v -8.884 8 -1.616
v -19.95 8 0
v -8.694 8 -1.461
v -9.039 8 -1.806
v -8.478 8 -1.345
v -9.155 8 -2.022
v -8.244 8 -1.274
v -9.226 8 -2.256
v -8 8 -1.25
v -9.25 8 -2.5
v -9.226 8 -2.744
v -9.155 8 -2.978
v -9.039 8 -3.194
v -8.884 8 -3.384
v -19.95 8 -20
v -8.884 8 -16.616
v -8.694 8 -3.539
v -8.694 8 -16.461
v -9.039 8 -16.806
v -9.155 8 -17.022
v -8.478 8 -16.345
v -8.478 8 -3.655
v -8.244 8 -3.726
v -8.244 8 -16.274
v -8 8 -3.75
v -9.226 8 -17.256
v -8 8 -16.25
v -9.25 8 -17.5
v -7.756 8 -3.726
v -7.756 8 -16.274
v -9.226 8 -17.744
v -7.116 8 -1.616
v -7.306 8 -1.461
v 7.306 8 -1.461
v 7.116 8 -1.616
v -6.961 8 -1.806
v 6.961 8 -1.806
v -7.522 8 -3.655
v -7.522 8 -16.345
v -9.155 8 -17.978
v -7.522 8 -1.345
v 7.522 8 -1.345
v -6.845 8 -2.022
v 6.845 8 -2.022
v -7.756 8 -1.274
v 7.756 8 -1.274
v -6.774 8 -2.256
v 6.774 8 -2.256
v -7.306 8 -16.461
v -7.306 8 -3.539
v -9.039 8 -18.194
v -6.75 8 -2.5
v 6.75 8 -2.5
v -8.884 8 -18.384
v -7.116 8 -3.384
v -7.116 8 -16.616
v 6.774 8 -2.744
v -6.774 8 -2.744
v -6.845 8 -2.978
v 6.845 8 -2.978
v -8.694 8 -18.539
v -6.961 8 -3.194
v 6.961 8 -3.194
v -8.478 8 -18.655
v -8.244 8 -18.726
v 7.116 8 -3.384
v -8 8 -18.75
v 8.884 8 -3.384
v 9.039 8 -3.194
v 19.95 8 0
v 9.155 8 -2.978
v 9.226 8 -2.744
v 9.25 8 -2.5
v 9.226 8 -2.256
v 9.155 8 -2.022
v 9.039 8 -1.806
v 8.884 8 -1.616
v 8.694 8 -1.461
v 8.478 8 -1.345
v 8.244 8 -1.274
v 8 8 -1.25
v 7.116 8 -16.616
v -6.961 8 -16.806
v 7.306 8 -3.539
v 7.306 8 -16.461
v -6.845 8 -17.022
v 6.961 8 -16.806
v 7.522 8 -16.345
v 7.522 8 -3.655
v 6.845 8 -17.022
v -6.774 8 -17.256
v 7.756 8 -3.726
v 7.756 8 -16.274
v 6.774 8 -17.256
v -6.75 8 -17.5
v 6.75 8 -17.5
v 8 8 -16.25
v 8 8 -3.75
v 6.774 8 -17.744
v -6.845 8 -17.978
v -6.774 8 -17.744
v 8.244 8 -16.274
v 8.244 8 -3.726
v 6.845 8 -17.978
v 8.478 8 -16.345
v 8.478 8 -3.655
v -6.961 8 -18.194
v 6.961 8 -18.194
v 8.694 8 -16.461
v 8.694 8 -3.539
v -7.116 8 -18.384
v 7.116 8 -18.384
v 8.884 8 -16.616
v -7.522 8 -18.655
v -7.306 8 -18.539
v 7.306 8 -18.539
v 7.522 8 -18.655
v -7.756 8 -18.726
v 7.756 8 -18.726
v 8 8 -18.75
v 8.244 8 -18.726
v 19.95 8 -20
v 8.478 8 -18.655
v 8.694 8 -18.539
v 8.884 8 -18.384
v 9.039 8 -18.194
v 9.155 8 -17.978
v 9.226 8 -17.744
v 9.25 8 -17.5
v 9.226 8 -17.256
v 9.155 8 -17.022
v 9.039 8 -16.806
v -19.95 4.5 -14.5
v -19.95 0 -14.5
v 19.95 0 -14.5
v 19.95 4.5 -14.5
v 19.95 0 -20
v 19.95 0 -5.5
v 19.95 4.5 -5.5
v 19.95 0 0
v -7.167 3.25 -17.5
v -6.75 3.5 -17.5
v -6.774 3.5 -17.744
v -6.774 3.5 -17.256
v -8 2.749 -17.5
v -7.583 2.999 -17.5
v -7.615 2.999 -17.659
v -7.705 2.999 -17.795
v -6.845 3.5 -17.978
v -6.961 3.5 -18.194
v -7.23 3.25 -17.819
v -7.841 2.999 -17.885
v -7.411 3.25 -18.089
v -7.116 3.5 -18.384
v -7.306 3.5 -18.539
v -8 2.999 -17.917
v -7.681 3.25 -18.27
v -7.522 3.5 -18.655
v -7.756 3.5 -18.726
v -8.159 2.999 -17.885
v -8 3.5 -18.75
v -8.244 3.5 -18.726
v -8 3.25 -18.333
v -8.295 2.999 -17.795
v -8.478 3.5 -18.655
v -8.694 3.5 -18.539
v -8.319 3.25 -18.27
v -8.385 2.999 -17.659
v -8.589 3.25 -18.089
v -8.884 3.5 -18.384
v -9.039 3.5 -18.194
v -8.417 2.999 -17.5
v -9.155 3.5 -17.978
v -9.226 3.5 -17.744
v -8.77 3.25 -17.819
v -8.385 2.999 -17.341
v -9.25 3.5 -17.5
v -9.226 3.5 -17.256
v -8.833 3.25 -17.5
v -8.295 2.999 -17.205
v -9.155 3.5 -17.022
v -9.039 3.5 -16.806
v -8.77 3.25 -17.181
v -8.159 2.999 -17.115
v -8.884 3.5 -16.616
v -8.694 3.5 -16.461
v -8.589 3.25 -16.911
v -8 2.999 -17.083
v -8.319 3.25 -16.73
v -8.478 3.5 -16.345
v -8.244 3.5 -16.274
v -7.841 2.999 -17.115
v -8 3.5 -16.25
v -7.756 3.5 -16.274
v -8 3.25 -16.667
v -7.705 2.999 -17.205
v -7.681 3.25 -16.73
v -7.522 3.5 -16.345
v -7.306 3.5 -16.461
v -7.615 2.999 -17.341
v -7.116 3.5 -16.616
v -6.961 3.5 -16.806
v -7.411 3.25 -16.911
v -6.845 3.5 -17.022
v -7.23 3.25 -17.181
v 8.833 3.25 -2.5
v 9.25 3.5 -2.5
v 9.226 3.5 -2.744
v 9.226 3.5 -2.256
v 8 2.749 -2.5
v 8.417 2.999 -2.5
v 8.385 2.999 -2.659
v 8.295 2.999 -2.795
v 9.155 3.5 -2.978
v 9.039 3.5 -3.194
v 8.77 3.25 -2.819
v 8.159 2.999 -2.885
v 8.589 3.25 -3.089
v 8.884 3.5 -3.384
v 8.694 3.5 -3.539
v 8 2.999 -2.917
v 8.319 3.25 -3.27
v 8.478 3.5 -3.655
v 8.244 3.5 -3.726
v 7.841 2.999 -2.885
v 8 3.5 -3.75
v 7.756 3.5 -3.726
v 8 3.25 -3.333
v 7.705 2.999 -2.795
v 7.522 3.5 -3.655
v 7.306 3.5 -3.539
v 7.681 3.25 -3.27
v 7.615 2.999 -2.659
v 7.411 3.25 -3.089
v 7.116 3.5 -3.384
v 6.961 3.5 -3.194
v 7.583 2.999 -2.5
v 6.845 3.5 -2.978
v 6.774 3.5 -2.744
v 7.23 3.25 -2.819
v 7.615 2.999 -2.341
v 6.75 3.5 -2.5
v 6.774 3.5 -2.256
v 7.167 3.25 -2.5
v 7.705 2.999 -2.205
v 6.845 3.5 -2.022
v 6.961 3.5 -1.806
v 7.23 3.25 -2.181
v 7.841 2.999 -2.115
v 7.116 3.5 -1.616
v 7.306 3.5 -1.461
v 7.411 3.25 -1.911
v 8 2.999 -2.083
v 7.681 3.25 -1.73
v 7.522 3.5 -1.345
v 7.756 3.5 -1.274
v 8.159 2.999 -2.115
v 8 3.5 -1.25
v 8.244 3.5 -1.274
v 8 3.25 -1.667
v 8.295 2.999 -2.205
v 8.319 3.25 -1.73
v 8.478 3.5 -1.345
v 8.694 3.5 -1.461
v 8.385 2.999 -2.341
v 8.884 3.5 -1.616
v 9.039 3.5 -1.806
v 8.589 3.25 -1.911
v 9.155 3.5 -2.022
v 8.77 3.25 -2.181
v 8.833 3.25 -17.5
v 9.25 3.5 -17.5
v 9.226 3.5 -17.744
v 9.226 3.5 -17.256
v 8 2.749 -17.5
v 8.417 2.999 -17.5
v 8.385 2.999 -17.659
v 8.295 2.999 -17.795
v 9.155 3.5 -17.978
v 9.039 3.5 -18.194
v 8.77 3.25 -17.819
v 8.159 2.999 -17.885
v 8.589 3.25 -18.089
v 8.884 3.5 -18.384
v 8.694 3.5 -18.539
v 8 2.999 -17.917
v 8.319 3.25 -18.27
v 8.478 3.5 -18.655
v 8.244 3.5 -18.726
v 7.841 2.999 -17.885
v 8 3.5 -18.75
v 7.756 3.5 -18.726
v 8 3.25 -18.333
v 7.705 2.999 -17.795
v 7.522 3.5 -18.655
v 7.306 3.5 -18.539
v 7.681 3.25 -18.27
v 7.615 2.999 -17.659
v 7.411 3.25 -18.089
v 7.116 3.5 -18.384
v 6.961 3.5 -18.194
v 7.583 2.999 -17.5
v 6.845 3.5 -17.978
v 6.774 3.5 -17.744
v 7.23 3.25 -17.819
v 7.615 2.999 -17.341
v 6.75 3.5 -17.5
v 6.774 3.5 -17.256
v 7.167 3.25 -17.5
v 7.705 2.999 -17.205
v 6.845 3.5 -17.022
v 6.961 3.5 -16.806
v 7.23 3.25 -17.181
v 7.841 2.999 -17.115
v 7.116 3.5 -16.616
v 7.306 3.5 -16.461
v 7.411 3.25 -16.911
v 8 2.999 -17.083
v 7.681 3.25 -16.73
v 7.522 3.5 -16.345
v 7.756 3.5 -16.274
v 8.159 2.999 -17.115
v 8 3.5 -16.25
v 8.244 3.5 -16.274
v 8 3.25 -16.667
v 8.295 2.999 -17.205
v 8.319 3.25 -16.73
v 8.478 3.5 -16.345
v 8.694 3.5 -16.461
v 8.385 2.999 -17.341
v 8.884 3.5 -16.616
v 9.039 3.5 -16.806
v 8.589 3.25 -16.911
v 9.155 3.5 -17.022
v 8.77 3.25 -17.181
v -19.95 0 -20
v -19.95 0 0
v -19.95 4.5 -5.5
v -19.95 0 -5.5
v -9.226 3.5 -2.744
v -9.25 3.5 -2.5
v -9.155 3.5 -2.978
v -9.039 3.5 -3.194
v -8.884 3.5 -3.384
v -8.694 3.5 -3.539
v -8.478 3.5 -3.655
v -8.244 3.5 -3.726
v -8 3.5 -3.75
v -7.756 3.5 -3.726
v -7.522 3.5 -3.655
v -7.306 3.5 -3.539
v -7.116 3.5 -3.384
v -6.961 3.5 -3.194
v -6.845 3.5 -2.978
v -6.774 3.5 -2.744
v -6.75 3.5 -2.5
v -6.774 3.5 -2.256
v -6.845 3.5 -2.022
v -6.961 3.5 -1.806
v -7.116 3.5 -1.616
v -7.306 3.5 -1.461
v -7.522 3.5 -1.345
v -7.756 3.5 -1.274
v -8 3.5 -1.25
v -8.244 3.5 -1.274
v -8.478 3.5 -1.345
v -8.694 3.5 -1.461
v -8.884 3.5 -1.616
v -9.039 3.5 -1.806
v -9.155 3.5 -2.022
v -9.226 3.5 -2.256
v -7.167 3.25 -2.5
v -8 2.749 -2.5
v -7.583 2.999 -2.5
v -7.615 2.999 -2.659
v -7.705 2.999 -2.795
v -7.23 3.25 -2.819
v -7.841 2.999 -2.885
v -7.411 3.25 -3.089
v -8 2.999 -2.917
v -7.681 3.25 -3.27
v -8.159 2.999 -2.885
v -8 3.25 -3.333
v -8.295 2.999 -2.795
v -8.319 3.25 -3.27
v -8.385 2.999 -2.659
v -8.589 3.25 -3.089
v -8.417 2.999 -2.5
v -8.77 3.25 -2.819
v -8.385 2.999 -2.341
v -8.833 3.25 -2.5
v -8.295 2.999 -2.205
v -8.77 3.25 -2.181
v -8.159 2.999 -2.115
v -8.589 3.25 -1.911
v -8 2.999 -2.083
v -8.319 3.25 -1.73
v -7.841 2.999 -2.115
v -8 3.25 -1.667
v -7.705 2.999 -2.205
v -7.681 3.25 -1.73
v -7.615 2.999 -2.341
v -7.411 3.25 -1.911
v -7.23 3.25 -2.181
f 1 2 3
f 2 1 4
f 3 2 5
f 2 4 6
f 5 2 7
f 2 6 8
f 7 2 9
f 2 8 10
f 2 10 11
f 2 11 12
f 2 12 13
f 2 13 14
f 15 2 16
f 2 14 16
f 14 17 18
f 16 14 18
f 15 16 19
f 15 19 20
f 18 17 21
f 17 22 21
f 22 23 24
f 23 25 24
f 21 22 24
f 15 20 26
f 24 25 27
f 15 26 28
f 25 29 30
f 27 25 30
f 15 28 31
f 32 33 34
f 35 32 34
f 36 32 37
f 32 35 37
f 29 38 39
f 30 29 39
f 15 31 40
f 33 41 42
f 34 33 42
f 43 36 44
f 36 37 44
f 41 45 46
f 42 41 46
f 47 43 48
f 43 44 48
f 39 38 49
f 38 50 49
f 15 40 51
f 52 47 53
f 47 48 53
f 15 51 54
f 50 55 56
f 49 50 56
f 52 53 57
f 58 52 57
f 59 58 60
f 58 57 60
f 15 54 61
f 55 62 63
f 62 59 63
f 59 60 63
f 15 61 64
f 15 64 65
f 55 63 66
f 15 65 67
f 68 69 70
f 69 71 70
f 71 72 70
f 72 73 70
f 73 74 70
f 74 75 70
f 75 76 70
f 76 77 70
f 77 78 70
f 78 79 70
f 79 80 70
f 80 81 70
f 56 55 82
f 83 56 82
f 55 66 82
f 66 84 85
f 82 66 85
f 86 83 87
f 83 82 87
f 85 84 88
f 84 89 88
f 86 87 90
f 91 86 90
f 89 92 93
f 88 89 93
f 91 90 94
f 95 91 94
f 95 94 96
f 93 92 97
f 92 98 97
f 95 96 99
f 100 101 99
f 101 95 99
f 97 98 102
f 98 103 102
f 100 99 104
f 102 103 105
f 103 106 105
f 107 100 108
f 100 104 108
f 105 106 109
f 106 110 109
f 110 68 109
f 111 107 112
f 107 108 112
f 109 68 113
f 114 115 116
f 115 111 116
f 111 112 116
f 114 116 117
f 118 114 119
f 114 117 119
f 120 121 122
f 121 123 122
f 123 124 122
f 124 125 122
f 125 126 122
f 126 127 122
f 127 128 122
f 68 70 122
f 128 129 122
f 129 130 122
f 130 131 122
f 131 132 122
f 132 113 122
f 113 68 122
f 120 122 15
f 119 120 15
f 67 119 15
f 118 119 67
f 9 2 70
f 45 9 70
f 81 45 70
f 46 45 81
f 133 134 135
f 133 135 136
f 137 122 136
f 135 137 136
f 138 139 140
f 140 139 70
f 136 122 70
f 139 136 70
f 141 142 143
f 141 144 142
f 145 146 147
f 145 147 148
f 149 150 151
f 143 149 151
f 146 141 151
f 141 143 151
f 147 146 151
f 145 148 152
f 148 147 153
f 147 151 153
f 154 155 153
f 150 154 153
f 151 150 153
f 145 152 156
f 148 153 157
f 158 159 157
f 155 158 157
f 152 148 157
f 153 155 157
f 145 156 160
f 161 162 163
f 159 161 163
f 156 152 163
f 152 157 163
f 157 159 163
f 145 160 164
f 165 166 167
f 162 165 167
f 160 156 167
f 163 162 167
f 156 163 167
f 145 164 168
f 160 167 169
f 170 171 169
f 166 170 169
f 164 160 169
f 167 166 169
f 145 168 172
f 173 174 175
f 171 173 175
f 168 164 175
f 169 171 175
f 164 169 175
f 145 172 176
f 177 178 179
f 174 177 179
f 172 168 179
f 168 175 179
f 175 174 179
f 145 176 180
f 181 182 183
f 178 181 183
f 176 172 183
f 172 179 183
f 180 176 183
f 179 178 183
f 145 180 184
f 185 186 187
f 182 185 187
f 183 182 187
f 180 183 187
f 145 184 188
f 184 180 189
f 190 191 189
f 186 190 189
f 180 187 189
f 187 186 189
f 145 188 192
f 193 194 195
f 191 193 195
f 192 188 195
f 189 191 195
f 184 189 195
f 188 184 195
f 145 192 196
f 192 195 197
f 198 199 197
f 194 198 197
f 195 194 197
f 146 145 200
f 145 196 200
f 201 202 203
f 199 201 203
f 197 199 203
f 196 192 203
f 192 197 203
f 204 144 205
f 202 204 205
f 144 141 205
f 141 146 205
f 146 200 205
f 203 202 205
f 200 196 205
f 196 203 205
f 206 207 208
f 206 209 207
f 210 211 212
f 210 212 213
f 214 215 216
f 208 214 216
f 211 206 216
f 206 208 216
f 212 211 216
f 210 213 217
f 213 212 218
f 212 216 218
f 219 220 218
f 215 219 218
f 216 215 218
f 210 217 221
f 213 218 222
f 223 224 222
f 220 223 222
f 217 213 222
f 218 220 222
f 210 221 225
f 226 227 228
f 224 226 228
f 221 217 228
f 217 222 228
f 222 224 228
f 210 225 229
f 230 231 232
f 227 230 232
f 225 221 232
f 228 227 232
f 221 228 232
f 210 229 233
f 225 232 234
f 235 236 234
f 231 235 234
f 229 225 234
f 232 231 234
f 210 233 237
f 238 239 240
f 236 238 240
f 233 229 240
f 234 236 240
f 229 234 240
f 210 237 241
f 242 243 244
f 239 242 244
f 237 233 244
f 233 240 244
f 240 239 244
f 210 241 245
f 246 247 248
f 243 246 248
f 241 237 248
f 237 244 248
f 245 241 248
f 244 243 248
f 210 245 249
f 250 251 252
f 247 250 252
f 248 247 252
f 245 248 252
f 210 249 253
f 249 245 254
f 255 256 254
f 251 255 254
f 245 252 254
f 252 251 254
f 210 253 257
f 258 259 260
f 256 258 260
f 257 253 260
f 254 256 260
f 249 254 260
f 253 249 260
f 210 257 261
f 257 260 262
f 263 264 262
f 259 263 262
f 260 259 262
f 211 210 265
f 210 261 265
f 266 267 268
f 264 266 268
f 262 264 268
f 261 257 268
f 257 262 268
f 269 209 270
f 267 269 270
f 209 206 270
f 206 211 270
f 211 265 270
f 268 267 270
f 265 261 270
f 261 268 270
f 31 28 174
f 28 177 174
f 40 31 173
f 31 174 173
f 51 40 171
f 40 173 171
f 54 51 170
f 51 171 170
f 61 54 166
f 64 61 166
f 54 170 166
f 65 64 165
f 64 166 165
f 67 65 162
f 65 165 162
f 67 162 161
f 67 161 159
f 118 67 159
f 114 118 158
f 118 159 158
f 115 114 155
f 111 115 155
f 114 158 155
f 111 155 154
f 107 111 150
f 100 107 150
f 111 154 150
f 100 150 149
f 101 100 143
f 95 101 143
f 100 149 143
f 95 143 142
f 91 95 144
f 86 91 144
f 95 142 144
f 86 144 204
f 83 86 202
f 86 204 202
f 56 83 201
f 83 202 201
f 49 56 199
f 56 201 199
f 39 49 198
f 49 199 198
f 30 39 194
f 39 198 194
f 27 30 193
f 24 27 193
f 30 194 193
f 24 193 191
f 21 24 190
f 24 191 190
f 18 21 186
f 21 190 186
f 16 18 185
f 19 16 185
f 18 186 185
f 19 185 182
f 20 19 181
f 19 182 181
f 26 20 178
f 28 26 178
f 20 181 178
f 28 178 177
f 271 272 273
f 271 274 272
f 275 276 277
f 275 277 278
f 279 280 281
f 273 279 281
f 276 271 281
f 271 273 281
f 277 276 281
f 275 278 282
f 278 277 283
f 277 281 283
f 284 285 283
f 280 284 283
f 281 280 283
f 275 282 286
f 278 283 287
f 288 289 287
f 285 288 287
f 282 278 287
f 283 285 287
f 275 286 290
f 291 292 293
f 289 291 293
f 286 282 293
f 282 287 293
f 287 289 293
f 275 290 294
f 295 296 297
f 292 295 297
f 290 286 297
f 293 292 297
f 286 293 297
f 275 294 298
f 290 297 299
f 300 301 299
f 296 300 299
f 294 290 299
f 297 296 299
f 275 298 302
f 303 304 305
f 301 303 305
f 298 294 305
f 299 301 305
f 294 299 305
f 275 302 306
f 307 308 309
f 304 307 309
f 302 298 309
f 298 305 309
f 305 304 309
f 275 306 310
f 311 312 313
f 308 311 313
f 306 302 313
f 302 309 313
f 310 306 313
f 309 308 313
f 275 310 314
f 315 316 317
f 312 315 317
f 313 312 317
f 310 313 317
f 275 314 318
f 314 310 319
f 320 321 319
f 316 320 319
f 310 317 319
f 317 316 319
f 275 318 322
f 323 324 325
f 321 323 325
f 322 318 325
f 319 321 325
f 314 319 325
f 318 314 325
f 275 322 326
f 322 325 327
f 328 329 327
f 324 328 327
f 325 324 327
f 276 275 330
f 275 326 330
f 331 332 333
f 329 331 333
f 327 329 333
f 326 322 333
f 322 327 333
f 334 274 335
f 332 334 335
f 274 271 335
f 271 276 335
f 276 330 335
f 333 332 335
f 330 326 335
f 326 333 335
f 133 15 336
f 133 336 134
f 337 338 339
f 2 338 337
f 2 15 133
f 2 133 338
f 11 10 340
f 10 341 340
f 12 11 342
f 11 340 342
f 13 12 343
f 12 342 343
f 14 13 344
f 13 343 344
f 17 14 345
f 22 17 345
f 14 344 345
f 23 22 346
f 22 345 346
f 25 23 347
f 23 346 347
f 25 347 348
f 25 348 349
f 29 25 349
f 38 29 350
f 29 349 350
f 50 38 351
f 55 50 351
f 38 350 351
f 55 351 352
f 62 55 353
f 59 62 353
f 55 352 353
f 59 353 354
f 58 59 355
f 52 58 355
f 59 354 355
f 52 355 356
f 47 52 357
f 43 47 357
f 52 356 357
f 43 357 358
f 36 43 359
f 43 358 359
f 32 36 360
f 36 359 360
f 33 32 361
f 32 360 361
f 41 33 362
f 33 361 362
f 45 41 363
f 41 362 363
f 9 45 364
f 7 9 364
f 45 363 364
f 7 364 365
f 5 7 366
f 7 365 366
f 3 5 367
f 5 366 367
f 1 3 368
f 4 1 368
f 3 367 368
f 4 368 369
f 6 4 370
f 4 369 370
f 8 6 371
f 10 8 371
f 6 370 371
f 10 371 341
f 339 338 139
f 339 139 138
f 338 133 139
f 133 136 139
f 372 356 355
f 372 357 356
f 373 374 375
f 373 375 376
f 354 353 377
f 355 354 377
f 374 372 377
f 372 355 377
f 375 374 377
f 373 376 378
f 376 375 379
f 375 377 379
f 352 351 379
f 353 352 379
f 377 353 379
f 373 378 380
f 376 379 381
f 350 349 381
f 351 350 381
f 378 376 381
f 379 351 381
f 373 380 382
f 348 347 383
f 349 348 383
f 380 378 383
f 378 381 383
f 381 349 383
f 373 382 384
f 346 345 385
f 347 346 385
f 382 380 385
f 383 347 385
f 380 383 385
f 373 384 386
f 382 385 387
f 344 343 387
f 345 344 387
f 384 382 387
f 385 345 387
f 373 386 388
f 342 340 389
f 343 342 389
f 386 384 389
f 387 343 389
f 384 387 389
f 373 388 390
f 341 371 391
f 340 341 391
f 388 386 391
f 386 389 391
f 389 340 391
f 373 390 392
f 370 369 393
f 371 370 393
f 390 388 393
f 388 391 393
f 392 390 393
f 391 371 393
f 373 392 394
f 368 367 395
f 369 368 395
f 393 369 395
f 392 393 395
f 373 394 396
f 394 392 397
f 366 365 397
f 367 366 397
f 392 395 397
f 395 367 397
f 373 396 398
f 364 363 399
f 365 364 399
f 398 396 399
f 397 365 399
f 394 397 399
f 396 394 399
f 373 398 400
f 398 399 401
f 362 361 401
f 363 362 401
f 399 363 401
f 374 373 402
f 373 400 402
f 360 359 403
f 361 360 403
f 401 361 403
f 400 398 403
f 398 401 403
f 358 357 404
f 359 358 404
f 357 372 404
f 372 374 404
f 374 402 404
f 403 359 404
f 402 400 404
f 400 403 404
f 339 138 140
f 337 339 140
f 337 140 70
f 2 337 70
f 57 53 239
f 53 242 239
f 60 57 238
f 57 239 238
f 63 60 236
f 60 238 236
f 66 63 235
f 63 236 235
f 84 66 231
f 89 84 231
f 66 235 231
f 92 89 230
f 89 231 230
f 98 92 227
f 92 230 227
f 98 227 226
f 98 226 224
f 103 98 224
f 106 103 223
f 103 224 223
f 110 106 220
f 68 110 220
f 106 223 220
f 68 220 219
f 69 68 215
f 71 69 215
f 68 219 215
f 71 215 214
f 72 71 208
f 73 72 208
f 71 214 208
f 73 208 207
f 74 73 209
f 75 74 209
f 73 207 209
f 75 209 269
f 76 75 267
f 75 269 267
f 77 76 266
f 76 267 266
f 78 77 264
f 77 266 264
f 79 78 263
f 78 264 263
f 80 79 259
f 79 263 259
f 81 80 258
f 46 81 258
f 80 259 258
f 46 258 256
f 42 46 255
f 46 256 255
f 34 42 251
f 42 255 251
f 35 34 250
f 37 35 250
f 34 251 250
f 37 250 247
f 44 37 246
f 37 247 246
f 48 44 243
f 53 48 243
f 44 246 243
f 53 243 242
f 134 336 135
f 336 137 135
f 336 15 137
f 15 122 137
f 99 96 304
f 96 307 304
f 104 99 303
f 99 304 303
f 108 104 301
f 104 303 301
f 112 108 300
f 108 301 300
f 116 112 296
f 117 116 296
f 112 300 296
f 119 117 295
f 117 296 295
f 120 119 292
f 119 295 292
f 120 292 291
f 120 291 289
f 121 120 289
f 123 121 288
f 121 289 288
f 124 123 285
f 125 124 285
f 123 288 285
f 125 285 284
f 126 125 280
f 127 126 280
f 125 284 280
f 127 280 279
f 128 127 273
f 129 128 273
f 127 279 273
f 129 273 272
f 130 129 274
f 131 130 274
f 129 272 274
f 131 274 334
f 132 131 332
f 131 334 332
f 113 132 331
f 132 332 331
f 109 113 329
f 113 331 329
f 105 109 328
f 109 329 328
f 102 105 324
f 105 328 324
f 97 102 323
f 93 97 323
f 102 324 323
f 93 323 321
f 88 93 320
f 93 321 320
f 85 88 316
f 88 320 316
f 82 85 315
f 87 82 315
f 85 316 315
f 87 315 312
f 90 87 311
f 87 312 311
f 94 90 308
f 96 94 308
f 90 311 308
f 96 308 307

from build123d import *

# Parameters (mm, degrees)
EXTRUDE_1_DEPTH        = 19.95
HOLE_WIZARD_M3_1_D     = 2.5
HOLE_WIZARD_M3_1_DEPTH = 4.5
HOLE_WIZARD_M3_1_TIP   = 0.751075774


with BuildPart() as part:
    # 草图1 → 凸台-拉伸1 (new, symmetric)
    with BuildSketch(Plane(origin=(0, 0, 0), x_dir=(0, 0, -1), z_dir=(1, 0, 0))):
        Polygon((0, 0), (0, 8), (20, 8), (20, 0), (14.5, 0), (14.5, 4.5), (5.5, 4.5), (5.5, 0), align=None)
    extrude(amount=EXTRUDE_1_DEPTH, both=True)

    # M3 螺纹孔1
    with Locations(Plane(origin=(0, 8, 0), x_dir=(1, 0, 0), z_dir=(0, 1, 0))):
        with Locations((-8, 17.5), (8, 17.5), (8, 2.5), (-8, 2.5)):
            Hole(HOLE_WIZARD_M3_1_D / 2, depth=HOLE_WIZARD_M3_1_DEPTH)
            with Locations((0, 0, -(HOLE_WIZARD_M3_1_DEPTH + HOLE_WIZARD_M3_1_TIP / 2))):  # 118° drill point
                Cone(0, HOLE_WIZARD_M3_1_D / 2, HOLE_WIZARD_M3_1_TIP, mode=Mode.SUBTRACT)


solid = part.part
